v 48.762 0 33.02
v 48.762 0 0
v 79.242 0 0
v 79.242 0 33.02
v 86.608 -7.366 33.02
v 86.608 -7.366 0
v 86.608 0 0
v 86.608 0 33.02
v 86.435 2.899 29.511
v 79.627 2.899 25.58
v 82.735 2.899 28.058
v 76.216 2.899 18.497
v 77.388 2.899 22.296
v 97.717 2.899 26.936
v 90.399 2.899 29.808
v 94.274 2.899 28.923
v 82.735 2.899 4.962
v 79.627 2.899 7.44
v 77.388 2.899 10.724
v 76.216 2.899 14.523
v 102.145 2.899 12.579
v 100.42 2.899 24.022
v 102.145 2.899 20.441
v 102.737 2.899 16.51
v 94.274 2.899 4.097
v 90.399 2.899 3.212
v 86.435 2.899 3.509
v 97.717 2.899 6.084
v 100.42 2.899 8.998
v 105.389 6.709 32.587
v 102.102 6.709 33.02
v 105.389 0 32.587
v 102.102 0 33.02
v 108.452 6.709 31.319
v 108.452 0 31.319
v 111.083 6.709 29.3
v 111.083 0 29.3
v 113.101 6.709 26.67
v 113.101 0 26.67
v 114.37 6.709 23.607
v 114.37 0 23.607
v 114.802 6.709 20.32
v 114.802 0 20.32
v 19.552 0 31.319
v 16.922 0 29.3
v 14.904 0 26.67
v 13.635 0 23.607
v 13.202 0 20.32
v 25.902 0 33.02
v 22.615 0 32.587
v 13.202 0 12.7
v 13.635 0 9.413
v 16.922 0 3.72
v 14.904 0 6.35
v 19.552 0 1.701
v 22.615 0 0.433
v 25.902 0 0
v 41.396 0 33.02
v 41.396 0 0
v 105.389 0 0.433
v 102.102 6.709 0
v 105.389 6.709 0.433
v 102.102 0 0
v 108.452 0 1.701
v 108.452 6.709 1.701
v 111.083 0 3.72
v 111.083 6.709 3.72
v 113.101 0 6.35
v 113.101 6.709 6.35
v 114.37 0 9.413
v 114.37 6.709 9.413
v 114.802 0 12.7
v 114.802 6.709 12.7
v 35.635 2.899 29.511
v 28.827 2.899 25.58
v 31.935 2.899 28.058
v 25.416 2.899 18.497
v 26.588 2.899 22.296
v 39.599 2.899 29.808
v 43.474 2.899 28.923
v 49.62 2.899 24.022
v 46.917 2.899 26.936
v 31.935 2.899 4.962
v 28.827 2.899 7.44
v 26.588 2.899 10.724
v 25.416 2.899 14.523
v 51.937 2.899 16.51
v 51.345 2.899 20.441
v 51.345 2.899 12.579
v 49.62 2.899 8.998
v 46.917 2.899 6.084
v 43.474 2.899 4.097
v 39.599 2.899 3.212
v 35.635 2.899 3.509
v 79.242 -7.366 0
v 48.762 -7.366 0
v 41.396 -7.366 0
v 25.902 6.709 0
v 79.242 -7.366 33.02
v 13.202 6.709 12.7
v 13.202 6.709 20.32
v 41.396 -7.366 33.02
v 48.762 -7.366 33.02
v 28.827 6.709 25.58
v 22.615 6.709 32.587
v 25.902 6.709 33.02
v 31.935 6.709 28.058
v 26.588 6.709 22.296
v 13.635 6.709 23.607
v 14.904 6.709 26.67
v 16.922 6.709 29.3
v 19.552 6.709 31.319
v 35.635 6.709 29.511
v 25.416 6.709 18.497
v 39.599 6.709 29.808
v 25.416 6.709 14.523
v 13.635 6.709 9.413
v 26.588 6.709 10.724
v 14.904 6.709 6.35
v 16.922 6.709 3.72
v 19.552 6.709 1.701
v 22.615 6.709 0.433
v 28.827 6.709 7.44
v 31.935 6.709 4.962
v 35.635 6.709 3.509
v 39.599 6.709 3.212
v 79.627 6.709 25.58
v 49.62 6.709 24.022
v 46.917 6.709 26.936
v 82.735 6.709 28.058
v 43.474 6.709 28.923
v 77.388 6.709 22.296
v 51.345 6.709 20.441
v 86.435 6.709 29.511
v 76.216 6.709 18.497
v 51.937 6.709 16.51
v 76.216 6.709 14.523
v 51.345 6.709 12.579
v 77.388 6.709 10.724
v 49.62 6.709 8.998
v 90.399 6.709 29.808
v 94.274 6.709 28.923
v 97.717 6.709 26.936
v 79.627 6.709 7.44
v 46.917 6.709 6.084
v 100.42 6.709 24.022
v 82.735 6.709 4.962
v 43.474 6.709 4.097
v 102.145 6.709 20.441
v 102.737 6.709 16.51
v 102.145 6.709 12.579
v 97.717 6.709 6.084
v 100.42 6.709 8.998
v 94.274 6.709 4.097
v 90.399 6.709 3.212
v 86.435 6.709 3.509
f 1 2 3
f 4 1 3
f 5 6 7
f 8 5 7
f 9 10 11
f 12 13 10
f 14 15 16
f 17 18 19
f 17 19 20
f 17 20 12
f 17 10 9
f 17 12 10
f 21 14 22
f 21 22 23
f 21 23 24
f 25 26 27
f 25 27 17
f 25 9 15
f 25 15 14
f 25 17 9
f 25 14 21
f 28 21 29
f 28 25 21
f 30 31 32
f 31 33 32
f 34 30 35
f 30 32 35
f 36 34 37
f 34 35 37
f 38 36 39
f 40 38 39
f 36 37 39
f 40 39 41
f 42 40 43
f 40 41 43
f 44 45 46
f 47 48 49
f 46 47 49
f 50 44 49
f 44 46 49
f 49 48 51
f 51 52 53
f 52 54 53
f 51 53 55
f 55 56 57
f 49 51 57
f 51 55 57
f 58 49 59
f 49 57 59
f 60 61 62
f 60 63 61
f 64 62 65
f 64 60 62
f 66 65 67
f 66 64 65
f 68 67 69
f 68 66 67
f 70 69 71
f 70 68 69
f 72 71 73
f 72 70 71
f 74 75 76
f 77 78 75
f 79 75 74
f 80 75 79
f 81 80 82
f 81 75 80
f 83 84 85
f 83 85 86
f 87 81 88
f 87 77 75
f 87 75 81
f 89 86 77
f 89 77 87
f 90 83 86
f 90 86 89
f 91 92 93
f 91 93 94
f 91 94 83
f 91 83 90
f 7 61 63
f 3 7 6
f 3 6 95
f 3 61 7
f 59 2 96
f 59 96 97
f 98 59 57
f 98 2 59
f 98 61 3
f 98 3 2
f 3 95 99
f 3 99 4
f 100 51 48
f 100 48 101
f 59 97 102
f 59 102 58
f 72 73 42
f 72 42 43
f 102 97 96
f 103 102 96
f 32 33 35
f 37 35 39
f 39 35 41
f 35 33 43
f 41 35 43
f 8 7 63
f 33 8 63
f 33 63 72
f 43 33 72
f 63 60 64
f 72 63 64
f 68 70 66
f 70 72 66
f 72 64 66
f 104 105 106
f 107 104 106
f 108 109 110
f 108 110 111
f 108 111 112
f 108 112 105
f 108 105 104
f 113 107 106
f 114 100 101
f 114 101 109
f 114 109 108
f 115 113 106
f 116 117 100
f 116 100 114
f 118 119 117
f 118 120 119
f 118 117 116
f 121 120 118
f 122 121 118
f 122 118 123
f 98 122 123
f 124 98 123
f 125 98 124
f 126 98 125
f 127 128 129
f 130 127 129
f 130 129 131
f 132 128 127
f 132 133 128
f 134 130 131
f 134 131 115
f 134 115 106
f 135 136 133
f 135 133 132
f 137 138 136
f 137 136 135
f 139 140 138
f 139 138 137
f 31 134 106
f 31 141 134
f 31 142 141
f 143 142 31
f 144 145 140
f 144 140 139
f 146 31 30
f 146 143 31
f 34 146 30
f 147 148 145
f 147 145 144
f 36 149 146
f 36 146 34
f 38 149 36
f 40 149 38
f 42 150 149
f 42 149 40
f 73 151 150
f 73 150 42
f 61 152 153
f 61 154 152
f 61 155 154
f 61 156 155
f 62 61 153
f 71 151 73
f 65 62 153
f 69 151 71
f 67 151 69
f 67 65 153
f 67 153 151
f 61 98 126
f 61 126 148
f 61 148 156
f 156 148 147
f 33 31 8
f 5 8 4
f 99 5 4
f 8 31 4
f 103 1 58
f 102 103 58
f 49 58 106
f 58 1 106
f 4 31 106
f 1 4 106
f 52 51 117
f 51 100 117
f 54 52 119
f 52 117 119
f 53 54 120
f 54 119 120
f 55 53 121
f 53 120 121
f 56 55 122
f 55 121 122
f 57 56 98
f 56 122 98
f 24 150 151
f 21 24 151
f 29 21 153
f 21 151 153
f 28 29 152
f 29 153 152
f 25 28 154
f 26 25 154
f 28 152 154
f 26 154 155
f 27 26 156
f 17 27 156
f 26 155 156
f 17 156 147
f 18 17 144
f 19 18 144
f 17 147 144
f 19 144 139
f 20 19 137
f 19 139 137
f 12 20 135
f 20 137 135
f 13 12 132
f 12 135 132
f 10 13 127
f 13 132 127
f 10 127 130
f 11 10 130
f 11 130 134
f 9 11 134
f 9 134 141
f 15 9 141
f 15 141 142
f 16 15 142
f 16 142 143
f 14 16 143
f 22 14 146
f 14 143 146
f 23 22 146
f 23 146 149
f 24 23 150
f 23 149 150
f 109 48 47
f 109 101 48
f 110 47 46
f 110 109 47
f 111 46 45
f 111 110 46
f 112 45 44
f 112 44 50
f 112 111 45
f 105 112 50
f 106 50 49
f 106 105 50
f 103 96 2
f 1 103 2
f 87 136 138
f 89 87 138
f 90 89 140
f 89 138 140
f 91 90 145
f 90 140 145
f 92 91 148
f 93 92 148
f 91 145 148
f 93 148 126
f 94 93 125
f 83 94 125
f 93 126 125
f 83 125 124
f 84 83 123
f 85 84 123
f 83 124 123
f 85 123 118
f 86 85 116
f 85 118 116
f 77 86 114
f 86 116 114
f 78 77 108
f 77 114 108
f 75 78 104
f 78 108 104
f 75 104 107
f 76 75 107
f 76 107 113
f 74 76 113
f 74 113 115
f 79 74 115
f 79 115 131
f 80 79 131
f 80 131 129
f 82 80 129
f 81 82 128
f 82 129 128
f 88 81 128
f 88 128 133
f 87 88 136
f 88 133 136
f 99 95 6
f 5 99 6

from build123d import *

# Parameters (mm, degrees)
SKETCH1_W           = 7.366
SKETCH1_H           = 7.366
BOSS_EXTRUDE1_DEPTH = 33.02
SKETCH2_R           = 13.335
CUT_EXTRUDE1_DEPTH  = 3.81
FILLET1_R           = 12.7


with BuildPart() as part:
    # Sketch1 → Boss-Extrude1 (new body)
    with BuildSketch(Plane.XY):
        Polygon((48.76226865, 0), (41.39626865, 0), (13.20226865, 0), (13.20226865, 6.709268486), (114.80226865, 6.709268486), (114.80226865, 0), (86.60826865, 0), (79.24226865, 0), align=None)
        with Locations((45.07926865, -3.683)):
            Rectangle(SKETCH1_W, SKETCH1_H)
        with Locations((82.92526865, -3.683)):
            Rectangle(SKETCH1_W, SKETCH1_H)
    extrude(amount=BOSS_EXTRUDE1_DEPTH)

    # Sketch2 → Cut-Extrude1 (cut)
    with BuildSketch(Plane(origin=(0, 6.709268486, 0), x_dir=(1, 0, 0), z_dir=(0, 1, 0))):
        with Locations((38.60226865, -16.51)):
            Circle(SKETCH2_R)
        with Locations((89.40226865, -16.51)):
            Circle(SKETCH2_R)
    extrude(amount=-CUT_EXTRUDE1_DEPTH, mode=Mode.SUBTRACT)

    # Fillet1
    fillet1_edges = [part.edges().sort_by_distance(p)[0] for p in [
        (114.80226865, 3.354634243, 33.02),
        (13.20226865, 3.354634243, 0),
        (114.80226865, 3.354634243, 0),
        (13.20226865, 3.354634243, 33.02),
    ]]
    fillet(fillet1_edges, radius=FILLET1_R)


solid = part.part
